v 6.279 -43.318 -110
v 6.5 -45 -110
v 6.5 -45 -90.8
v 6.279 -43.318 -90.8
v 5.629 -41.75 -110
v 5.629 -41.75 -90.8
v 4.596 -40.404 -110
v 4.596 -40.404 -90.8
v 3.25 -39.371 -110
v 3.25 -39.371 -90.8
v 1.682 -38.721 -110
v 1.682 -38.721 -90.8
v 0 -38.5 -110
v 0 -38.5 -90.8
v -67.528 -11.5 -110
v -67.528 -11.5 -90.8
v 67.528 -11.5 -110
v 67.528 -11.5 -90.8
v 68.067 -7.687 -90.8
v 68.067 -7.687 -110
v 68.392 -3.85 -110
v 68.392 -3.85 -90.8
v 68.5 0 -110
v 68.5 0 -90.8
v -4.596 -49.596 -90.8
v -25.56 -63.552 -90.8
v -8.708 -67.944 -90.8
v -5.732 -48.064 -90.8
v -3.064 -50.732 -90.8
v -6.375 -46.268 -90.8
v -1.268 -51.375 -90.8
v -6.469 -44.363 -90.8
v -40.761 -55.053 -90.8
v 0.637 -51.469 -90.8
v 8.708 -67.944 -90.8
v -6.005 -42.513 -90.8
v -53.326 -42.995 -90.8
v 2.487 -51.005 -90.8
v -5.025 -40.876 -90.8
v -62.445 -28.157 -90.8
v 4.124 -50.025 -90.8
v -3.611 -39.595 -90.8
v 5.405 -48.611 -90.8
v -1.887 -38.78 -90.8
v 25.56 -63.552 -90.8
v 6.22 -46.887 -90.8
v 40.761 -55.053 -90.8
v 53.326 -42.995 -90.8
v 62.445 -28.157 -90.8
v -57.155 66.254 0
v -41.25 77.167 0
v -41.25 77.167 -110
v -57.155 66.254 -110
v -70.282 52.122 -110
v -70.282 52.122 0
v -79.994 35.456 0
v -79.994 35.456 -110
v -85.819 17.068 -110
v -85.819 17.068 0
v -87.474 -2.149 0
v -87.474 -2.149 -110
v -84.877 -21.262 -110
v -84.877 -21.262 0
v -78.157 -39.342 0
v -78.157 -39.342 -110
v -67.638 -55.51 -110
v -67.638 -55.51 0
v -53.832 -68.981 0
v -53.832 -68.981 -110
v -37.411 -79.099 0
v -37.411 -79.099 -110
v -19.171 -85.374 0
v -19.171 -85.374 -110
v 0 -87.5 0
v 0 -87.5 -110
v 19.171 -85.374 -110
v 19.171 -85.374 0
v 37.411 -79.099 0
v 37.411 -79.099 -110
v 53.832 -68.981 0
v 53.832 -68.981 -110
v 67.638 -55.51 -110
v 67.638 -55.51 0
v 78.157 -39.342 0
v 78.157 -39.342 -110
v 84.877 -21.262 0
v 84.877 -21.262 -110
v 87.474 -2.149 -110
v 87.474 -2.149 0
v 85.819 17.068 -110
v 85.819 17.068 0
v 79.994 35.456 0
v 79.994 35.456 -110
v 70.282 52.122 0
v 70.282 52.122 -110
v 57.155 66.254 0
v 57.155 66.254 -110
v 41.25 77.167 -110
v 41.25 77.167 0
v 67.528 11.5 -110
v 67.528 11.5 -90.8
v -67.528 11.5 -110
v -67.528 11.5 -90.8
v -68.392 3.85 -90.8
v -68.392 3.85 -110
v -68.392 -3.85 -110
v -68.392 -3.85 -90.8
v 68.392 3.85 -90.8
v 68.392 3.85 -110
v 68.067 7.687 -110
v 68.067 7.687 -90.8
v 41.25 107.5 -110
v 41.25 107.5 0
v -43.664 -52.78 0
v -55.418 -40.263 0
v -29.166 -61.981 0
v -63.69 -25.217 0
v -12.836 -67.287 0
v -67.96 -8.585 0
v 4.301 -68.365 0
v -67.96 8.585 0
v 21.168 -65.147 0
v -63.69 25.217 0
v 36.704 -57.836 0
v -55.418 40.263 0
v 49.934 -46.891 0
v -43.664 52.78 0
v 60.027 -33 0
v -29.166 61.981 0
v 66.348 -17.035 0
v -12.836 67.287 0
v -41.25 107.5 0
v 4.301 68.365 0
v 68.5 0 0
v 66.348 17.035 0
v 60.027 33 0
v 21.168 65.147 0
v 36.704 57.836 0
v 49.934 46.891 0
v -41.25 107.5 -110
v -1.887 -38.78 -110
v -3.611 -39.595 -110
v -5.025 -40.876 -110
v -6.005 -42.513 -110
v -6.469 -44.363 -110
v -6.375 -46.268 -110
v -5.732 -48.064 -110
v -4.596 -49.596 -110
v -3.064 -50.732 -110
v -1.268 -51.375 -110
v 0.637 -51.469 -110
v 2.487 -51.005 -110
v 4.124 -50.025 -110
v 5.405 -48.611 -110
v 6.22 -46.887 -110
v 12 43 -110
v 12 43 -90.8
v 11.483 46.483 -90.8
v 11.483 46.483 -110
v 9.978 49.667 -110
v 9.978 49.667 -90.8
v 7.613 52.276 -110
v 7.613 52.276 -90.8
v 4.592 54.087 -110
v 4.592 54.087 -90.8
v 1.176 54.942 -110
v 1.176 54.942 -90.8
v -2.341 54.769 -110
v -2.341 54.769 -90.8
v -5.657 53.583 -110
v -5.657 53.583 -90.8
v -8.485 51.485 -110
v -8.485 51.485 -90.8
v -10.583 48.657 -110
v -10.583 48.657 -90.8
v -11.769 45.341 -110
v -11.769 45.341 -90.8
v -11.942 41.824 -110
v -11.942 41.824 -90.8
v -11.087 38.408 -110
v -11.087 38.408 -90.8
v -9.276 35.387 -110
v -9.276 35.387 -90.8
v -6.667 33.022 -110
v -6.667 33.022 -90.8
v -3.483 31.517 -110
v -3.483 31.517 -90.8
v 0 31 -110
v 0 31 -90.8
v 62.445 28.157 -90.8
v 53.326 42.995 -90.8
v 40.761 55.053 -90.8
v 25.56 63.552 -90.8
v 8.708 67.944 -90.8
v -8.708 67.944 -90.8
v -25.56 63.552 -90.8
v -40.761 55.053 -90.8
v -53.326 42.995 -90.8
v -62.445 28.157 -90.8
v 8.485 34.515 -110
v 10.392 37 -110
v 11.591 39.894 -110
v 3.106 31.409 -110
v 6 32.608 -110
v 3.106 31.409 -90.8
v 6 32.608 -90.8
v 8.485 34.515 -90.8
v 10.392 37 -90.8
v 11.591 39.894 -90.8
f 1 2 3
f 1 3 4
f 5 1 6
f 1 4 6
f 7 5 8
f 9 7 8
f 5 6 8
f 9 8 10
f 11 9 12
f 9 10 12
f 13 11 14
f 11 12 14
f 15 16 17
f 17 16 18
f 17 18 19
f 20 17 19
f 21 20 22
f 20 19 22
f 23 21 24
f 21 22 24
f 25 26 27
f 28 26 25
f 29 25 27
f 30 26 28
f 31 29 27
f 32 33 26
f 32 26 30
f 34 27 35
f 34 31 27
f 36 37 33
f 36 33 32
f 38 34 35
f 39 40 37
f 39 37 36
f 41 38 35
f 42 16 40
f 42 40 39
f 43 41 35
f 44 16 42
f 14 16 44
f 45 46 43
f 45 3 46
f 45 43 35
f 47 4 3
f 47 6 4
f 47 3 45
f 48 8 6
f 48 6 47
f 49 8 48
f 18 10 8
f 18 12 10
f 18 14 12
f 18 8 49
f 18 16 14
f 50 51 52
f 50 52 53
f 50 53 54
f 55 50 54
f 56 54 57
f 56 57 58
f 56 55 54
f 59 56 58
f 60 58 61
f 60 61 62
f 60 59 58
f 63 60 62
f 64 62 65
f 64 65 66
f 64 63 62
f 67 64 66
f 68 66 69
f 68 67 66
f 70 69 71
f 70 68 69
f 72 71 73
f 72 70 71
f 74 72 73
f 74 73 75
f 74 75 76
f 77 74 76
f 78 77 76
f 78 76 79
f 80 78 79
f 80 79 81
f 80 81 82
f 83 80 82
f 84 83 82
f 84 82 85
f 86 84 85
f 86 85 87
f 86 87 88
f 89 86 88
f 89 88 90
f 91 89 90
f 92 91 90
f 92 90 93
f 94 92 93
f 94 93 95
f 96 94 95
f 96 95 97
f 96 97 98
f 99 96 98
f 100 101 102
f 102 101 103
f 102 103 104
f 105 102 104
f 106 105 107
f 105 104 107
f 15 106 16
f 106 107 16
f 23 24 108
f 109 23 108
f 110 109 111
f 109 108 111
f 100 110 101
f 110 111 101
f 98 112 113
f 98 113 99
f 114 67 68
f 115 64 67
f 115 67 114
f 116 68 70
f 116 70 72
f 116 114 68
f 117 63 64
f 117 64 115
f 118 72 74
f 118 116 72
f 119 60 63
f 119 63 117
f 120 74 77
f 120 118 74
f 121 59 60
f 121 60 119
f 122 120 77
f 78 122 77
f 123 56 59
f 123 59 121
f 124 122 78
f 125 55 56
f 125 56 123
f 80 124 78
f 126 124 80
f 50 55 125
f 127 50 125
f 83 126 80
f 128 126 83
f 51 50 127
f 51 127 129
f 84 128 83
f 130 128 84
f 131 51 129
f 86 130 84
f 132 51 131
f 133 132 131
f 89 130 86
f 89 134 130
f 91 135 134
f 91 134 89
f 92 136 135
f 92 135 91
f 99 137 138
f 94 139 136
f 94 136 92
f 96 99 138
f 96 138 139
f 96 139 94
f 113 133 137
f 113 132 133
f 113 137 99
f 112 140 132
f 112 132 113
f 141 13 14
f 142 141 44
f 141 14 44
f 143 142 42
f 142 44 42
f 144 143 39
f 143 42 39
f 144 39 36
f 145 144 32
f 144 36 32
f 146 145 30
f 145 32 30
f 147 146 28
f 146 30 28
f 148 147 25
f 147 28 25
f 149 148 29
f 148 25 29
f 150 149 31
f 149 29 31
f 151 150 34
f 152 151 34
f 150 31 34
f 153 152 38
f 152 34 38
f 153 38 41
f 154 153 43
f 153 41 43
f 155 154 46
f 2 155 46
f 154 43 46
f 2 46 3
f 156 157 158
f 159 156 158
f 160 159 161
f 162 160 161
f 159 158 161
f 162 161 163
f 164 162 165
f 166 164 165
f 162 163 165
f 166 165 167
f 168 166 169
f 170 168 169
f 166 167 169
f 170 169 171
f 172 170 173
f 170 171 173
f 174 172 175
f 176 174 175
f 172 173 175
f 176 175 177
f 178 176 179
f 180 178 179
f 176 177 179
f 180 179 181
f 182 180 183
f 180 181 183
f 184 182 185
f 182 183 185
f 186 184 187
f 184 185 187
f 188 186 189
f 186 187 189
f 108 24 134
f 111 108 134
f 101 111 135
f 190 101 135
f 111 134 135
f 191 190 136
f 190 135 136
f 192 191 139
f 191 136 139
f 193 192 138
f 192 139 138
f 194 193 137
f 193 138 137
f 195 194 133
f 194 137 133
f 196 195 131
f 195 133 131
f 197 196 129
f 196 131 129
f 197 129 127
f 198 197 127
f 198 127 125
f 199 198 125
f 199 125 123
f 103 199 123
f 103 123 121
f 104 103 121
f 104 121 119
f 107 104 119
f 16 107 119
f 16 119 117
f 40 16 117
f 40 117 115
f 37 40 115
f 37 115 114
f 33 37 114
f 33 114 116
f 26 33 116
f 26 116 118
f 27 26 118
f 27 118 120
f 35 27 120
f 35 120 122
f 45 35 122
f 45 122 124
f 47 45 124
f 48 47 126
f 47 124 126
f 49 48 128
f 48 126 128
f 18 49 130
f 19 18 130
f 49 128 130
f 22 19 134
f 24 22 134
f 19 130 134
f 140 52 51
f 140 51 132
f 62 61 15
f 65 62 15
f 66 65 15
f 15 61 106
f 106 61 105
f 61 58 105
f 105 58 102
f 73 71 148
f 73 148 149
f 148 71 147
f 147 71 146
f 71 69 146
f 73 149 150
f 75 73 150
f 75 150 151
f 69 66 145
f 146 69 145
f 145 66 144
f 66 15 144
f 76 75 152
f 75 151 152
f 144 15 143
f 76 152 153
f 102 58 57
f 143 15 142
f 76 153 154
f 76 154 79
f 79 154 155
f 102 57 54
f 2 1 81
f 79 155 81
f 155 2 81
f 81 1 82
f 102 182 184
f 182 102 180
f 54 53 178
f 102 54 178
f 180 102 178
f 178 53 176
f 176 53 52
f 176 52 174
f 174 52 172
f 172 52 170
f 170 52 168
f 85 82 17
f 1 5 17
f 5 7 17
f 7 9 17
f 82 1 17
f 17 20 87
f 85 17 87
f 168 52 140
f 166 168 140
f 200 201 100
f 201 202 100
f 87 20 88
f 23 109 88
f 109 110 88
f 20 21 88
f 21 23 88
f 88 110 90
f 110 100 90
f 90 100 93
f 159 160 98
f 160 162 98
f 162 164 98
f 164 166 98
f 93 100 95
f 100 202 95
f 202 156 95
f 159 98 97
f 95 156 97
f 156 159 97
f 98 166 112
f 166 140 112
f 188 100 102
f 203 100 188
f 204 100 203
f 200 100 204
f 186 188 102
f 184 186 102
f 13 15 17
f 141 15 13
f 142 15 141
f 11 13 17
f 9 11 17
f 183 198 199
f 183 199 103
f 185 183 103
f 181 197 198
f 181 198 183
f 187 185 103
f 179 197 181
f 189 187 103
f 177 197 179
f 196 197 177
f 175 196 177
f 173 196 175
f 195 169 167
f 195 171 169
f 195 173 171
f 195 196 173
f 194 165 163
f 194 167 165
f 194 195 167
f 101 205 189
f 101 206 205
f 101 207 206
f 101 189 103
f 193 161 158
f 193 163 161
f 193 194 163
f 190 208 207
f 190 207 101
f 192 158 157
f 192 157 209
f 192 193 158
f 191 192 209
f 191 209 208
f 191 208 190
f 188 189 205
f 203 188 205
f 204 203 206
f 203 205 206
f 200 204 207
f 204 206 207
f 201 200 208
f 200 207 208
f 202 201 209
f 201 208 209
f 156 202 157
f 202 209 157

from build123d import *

# Parameters (mm, degrees)
F0_W     = 330
F0_H     = 300
F1_DEPTH = 110
F2_R     = 68.5
F3_DEPTH = 90.8
F5_DEPTH = 19.201
F2_W     = 330
F2_H     = 300
F2_R_2   = 87.5
F6_DEPTH = 110.001
F8_DEPTH = 110


with BuildPart() as f1:
    # F0 (on Top) → F1 (new body)
    with BuildSketch(Plane.XY):
        Rectangle(F0_W, F0_H)
    extrude(amount=-F1_DEPTH)

    # F2 (on Top) → F3 (cut)
    with BuildSketch(Plane.XY):
        Circle(F2_R)
    extrude(amount=-F3_DEPTH, mode=Mode.SUBTRACT)

    # F4 (on face) → F5 (cut, through all)
    with BuildSketch(Plane.XY.offset(-90.8)):
        with BuildLine():
            Line((0, -11.5), (0, 0))
            Line((0, 0), (0, 11.5))
            Line((0, 11.5), (-67.5277720645, 11.5))
            ThreePointArc((-67.5277720645, 11.5), (-68.5, 0), (-67.5277720645, -11.5))
            Line((-67.5277720645, -11.5), (0, -11.5))
        make_face()
        with BuildLine():
            Line((0, 11.5), (0, 0))
            Line((0, 0), (0, -11.5))
            Line((0, -11.5), (67.5277720645, -11.5))
            ThreePointArc((67.5277720645, -11.5), (68.2565102625, -5.7705118308), (68.5, 0))
            ThreePointArc((68.5, 0), (68.2565102625, 5.7705118308), (67.5277720645, 11.5))
            Line((67.5277720645, 11.5), (0, 11.5))
        make_face()
        with BuildLine():
            ThreePointArc((12, 43), (-8.4852813742, 51.4852813742), (0, 31))
            ThreePointArc((0, 31), (8.4852813742, 34.5147186258), (12, 43))
        make_face()
        with BuildLine():
            ThreePointArc((6.5, -45), (4.5961940777, -40.4038059223), (0, -38.5))
            ThreePointArc((0, -38.5), (-4.5961940777, -49.5961940777), (6.5, -45))
        make_face()
    extrude(amount=-F5_DEPTH, mode=Mode.SUBTRACT)

    # F2 (on Top) → F6 (cut, through all)
    with BuildSketch(Plane.XY):
        Rectangle(F2_W, F2_H)
        Circle(F2_R_2, mode=Mode.SUBTRACT)
    extrude(amount=-F6_DEPTH, mode=Mode.SUBTRACT)

    # F7 (on face) → F8 (join)
    with BuildSketch(Plane(origin=(0, 0, -110), x_dir=(1, 0, 0), z_dir=(0, 0, -1))):
        with BuildLine():
            ThreePointArc((41.25, -77.1666216703), (0, -87.5), (-41.25, -77.1666216703))
            Line((-41.25, -77.1666216703), (-41.25, -107.5))
            Line((-41.25, -107.5), (41.25, -107.5))
            Line((41.25, -107.5), (41.25, -77.1666216703))
        make_face()
    extrude(amount=-F8_DEPTH)


solid = f1.part
